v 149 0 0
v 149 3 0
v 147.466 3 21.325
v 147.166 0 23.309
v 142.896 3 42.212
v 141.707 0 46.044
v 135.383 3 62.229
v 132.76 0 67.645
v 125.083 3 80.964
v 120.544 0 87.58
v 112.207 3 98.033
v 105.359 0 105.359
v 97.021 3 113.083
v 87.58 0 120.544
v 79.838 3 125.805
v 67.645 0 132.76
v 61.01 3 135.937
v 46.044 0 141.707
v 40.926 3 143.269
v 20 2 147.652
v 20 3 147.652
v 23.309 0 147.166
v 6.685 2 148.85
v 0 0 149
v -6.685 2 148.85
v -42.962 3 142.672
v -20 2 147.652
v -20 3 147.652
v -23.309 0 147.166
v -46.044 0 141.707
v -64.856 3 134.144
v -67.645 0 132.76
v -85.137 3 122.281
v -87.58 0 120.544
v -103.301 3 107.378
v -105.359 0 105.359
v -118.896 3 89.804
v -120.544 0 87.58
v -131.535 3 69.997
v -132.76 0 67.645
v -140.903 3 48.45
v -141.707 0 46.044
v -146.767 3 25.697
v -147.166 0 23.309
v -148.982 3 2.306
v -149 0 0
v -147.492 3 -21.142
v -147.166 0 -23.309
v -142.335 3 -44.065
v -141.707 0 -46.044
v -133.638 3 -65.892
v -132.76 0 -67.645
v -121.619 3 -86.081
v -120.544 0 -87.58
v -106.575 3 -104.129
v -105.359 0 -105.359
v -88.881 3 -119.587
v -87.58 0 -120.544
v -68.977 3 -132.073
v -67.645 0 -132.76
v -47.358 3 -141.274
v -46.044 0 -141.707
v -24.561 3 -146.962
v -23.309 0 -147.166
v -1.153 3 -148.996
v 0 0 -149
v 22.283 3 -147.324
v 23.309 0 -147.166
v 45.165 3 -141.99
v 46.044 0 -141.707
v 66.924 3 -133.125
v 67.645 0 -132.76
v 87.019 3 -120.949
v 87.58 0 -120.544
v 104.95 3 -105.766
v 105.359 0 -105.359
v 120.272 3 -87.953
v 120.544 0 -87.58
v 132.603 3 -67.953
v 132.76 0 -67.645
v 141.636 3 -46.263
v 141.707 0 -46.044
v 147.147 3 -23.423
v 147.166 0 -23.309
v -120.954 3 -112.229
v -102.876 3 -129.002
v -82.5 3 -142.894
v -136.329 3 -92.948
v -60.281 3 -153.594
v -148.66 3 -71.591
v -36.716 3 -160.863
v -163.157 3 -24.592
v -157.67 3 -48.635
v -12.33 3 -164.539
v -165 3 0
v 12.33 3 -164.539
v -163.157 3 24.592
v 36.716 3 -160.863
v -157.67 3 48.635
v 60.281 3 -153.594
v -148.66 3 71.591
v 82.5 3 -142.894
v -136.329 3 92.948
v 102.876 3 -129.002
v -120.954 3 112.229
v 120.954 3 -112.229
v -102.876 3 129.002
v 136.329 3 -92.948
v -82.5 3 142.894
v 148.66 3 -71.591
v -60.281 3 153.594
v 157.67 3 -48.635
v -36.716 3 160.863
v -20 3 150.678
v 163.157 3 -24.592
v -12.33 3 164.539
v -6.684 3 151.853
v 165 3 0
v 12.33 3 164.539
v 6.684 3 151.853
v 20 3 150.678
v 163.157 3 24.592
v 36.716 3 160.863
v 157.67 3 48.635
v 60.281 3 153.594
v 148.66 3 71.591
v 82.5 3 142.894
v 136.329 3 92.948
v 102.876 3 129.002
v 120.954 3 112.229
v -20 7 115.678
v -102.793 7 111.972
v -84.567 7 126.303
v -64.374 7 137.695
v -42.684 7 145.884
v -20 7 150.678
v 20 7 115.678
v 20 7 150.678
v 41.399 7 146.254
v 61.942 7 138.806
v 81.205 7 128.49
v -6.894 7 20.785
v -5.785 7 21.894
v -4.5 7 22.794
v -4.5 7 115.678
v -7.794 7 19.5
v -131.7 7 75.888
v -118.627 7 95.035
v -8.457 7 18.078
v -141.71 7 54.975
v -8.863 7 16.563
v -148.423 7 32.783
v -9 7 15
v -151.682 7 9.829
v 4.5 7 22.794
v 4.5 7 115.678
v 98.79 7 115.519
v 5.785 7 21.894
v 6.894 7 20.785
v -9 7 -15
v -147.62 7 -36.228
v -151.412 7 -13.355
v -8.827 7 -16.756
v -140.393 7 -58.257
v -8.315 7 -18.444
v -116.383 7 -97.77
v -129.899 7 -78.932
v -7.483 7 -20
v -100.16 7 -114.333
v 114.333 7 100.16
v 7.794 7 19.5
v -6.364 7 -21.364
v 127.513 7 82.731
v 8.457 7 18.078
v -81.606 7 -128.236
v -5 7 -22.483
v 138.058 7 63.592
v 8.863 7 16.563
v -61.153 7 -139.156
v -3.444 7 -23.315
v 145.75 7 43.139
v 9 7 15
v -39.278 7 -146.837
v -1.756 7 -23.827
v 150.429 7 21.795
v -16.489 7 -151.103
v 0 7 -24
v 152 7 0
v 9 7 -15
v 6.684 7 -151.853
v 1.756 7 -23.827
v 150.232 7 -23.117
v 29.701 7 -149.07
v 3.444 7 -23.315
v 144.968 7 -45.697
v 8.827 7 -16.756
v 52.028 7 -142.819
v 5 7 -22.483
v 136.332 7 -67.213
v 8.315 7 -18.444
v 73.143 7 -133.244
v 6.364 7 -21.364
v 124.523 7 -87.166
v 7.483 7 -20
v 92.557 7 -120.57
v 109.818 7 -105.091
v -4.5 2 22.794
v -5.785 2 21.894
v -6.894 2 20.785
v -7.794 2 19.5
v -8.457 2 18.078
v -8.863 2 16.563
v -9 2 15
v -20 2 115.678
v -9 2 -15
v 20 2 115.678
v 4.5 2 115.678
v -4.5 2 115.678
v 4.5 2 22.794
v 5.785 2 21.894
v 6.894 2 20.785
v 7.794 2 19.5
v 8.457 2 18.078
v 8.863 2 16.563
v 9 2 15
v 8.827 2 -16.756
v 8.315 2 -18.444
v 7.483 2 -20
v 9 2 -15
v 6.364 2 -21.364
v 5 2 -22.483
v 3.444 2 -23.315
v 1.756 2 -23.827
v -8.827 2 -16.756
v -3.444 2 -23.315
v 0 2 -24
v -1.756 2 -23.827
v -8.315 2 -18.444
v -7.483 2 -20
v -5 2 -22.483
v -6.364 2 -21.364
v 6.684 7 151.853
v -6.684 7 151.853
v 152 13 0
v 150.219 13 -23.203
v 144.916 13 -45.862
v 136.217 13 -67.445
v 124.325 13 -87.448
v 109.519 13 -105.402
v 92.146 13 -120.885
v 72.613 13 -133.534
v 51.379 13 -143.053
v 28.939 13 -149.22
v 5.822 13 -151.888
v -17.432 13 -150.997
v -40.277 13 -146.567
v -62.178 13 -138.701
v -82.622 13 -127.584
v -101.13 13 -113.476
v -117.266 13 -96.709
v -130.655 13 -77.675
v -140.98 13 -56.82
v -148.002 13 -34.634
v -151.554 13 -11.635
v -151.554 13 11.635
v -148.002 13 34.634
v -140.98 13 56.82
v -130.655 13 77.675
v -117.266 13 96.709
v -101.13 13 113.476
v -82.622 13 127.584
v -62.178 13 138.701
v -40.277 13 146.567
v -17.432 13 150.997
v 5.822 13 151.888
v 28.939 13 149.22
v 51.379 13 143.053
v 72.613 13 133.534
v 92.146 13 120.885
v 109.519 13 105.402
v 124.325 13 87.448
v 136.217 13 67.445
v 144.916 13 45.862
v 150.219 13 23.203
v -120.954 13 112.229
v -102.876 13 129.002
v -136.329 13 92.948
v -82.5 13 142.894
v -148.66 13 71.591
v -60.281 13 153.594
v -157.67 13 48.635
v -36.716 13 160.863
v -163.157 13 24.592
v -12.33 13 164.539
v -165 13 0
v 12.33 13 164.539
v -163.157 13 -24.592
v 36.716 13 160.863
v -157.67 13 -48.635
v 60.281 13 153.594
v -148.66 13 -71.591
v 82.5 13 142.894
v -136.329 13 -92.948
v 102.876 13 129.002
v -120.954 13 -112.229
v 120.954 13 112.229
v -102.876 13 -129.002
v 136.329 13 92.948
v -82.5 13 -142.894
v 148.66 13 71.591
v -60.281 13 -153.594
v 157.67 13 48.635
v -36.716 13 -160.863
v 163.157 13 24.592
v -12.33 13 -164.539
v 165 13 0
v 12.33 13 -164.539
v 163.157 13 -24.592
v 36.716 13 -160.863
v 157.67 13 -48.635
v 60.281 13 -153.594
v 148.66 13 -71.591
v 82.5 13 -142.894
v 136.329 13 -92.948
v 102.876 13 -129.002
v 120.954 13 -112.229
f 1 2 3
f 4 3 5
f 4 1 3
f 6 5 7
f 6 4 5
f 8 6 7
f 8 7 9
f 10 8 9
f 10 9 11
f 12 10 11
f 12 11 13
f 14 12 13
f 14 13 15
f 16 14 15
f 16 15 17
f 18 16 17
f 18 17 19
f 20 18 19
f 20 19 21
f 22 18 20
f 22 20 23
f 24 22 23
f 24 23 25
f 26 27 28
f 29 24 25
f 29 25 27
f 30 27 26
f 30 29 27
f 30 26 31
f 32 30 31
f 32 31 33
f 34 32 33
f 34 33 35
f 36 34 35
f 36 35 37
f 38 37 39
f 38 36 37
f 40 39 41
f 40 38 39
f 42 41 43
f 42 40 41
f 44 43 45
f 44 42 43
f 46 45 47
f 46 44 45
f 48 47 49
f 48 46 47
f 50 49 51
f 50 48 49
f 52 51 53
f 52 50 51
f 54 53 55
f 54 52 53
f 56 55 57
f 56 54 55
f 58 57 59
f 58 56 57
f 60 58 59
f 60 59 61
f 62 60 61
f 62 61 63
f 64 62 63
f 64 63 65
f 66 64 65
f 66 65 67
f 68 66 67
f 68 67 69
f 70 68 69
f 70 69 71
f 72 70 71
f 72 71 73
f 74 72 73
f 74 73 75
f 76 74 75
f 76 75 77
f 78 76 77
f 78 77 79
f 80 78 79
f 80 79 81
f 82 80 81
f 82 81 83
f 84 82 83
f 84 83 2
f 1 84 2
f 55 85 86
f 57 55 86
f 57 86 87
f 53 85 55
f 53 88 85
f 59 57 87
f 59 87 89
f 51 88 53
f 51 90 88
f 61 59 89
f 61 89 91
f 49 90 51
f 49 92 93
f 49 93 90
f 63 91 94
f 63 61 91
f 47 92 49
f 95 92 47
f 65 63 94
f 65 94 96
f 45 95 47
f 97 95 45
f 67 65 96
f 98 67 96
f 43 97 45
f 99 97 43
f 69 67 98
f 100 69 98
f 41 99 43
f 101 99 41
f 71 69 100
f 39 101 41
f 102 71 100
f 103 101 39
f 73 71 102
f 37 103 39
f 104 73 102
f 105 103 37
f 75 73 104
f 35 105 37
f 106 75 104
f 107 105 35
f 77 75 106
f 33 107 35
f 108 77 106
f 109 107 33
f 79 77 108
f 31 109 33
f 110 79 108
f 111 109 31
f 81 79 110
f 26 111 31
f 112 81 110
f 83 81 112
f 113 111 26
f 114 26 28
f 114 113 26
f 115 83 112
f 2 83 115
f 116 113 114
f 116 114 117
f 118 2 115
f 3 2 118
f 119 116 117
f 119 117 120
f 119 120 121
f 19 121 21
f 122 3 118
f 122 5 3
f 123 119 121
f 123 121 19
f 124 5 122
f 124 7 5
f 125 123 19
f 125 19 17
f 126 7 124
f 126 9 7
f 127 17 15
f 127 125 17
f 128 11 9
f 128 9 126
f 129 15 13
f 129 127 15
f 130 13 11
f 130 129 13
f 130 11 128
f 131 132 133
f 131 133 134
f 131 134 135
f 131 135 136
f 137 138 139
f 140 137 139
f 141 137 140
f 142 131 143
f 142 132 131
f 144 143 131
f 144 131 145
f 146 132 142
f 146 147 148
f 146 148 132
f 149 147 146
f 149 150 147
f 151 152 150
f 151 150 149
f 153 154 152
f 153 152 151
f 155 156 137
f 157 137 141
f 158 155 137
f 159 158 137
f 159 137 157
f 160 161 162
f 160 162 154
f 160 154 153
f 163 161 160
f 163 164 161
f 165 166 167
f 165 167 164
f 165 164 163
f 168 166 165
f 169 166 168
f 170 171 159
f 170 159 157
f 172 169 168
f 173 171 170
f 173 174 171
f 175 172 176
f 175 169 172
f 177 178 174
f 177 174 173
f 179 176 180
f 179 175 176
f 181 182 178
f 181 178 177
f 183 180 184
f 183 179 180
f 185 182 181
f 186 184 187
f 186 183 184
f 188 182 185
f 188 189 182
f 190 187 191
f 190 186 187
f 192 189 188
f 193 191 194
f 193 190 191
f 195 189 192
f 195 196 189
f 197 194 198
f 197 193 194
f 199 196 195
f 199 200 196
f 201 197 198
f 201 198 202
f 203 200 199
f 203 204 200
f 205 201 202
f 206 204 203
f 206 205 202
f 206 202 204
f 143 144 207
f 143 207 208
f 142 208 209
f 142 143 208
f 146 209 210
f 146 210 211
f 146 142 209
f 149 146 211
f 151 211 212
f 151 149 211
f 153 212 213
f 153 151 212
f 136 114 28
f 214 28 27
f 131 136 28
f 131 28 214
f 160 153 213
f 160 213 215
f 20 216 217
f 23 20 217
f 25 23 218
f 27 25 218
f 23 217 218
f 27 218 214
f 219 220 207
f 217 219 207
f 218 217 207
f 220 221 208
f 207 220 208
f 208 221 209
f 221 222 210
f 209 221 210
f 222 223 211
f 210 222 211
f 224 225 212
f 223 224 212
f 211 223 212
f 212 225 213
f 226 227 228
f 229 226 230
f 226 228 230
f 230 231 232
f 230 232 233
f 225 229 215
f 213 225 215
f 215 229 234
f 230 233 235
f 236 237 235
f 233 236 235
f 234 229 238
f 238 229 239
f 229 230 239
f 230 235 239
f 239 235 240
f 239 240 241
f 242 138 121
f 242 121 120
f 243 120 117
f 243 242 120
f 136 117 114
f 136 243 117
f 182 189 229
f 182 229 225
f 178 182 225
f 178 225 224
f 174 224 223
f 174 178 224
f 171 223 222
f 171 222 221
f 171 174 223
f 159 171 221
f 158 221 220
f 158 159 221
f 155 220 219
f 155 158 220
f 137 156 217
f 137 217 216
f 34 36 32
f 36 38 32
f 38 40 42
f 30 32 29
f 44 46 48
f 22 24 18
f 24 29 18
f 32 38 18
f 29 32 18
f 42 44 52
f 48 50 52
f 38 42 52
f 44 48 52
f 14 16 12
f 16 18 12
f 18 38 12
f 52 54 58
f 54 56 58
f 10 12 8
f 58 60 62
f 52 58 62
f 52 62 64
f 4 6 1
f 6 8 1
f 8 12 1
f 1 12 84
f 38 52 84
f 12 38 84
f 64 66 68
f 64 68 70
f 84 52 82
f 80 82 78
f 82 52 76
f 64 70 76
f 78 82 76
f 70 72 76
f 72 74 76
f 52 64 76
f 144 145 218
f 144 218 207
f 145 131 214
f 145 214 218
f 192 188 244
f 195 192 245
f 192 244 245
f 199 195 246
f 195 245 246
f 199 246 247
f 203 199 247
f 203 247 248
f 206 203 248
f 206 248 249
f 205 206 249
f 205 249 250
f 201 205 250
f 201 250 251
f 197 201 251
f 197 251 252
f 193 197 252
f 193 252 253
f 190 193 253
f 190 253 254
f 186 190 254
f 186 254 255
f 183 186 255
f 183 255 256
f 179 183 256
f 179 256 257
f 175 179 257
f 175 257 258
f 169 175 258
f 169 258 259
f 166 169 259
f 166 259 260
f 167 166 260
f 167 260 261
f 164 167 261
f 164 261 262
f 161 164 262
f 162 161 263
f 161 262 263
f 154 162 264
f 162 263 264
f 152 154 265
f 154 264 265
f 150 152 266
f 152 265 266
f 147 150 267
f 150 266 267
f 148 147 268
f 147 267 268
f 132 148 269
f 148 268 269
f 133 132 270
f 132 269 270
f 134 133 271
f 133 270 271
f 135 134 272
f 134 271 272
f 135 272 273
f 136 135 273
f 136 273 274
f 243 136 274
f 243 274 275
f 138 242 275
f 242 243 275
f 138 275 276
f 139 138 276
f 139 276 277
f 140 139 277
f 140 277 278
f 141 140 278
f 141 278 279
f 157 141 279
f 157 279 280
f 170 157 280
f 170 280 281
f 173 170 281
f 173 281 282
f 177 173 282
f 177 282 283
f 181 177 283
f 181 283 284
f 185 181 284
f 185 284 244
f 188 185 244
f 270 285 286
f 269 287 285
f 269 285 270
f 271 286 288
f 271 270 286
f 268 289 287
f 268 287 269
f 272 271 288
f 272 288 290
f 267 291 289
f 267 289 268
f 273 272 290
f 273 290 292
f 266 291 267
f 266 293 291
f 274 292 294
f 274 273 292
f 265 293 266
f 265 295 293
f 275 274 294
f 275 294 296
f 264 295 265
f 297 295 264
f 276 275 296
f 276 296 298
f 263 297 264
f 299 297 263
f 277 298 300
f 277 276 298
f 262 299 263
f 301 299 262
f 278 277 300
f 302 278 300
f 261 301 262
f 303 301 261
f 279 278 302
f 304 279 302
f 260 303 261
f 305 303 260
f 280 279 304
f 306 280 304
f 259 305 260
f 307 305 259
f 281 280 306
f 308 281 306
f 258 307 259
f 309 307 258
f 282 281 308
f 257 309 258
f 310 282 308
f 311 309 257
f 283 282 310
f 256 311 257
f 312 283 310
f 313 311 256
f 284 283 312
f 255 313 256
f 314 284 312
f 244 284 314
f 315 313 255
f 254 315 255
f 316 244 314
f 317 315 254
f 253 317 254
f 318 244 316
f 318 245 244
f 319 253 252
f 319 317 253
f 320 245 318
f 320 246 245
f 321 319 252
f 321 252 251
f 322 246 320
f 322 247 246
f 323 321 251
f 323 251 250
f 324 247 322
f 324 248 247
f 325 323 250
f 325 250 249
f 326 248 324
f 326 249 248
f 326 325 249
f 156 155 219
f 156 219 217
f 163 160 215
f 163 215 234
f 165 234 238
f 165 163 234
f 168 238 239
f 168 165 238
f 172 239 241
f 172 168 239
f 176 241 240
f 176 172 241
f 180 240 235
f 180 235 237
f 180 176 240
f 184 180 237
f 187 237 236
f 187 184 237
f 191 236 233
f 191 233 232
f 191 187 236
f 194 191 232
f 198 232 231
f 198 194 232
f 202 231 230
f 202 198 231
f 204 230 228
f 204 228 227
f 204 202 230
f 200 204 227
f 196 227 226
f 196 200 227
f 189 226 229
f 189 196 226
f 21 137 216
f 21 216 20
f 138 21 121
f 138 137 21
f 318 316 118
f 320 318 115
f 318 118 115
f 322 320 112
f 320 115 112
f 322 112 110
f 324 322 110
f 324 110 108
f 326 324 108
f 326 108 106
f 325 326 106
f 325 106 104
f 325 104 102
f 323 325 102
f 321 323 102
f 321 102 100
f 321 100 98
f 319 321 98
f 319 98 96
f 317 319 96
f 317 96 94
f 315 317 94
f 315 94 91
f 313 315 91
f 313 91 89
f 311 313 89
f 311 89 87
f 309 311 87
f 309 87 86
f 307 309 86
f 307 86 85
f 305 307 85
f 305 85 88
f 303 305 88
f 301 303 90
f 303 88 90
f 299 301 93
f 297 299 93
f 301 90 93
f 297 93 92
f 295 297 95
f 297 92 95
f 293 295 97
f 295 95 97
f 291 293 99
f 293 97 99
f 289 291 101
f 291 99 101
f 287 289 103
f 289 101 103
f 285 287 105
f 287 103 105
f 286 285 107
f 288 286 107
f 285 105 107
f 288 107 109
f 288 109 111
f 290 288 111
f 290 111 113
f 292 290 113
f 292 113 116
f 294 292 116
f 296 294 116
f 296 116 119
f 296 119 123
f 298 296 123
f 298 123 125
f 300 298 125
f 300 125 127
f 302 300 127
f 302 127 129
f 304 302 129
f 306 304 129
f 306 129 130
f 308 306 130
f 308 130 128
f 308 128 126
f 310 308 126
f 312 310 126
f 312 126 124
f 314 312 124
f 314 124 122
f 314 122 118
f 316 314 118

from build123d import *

# Parameters (mm, degrees)
SKETCH2_R           = 165
BOSS_EXTRUDE1_DEPTH = 13
SKETCH3_R           = 165
SKETCH3_R_2         = 149
CUT_EXTRUDE1_DEPTH  = 3
SKETCH4_R           = 152
CUT_EXTRUDE2_DEPTH  = 6
CUT_EXTRUDE3_DEPTH  = 5


with BuildPart() as part:
    # Sketch2 → Boss-Extrude1 (new body)
    with BuildSketch(Plane(origin=(0, 0, 0), x_dir=(1, 0, 0), z_dir=(0, 1, 0))):
        Circle(SKETCH2_R)
    extrude(amount=BOSS_EXTRUDE1_DEPTH)

    # Sketch3 → Cut-Extrude1 (cut)
    with BuildSketch(Plane.XZ):
        Circle(SKETCH3_R)
        Circle(SKETCH3_R_2, mode=Mode.SUBTRACT)
    extrude(amount=-CUT_EXTRUDE1_DEPTH, mode=Mode.SUBTRACT)

    # Sketch4 → Cut-Extrude2 (cut)
    with BuildSketch(Plane(origin=(0, 13, 0), x_dir=(1, 0, 0), z_dir=(0, 1, 0))):
        Circle(SKETCH4_R)
    extrude(amount=-CUT_EXTRUDE2_DEPTH, mode=Mode.SUBTRACT)

    # Sketch5 → Cut-Extrude3 (cut)
    with BuildSketch(Plane(origin=(0, 7, 0), x_dir=(1, 0, 0), z_dir=(0, 1, 0))):
        with BuildLine():
            Line((-4.5, -115.678465615), (-4.5, -22.794228634))
            ThreePointArc((-4.5, -22.794228634), (-7.794228634, -19.5), (-9, -15))
            Line((-9, -15), (-9, 15))
            ThreePointArc((-9, 15), (0, 24), (9, 15))
            Line((9, 15), (9, -15))
            ThreePointArc((9, -15), (7.794228634, -19.5), (4.5, -22.794228634))
            Line((4.5, -22.794228634), (4.5, -115.678465615))
            Line((4.5, -115.678465615), (20, -115.678465615))
            Line((20, -115.678465615), (20, -150.678465615))
            ThreePointArc((20, -150.678465615), (0, -152), (-20, -150.678465615))
            Line((-20, -150.678465615), (-20, -115.678465615))
            Line((-20, -115.678465615), (-4.5, -115.678465615))
        make_face()
    extrude(amount=-CUT_EXTRUDE3_DEPTH, mode=Mode.SUBTRACT)


solid = part.part
